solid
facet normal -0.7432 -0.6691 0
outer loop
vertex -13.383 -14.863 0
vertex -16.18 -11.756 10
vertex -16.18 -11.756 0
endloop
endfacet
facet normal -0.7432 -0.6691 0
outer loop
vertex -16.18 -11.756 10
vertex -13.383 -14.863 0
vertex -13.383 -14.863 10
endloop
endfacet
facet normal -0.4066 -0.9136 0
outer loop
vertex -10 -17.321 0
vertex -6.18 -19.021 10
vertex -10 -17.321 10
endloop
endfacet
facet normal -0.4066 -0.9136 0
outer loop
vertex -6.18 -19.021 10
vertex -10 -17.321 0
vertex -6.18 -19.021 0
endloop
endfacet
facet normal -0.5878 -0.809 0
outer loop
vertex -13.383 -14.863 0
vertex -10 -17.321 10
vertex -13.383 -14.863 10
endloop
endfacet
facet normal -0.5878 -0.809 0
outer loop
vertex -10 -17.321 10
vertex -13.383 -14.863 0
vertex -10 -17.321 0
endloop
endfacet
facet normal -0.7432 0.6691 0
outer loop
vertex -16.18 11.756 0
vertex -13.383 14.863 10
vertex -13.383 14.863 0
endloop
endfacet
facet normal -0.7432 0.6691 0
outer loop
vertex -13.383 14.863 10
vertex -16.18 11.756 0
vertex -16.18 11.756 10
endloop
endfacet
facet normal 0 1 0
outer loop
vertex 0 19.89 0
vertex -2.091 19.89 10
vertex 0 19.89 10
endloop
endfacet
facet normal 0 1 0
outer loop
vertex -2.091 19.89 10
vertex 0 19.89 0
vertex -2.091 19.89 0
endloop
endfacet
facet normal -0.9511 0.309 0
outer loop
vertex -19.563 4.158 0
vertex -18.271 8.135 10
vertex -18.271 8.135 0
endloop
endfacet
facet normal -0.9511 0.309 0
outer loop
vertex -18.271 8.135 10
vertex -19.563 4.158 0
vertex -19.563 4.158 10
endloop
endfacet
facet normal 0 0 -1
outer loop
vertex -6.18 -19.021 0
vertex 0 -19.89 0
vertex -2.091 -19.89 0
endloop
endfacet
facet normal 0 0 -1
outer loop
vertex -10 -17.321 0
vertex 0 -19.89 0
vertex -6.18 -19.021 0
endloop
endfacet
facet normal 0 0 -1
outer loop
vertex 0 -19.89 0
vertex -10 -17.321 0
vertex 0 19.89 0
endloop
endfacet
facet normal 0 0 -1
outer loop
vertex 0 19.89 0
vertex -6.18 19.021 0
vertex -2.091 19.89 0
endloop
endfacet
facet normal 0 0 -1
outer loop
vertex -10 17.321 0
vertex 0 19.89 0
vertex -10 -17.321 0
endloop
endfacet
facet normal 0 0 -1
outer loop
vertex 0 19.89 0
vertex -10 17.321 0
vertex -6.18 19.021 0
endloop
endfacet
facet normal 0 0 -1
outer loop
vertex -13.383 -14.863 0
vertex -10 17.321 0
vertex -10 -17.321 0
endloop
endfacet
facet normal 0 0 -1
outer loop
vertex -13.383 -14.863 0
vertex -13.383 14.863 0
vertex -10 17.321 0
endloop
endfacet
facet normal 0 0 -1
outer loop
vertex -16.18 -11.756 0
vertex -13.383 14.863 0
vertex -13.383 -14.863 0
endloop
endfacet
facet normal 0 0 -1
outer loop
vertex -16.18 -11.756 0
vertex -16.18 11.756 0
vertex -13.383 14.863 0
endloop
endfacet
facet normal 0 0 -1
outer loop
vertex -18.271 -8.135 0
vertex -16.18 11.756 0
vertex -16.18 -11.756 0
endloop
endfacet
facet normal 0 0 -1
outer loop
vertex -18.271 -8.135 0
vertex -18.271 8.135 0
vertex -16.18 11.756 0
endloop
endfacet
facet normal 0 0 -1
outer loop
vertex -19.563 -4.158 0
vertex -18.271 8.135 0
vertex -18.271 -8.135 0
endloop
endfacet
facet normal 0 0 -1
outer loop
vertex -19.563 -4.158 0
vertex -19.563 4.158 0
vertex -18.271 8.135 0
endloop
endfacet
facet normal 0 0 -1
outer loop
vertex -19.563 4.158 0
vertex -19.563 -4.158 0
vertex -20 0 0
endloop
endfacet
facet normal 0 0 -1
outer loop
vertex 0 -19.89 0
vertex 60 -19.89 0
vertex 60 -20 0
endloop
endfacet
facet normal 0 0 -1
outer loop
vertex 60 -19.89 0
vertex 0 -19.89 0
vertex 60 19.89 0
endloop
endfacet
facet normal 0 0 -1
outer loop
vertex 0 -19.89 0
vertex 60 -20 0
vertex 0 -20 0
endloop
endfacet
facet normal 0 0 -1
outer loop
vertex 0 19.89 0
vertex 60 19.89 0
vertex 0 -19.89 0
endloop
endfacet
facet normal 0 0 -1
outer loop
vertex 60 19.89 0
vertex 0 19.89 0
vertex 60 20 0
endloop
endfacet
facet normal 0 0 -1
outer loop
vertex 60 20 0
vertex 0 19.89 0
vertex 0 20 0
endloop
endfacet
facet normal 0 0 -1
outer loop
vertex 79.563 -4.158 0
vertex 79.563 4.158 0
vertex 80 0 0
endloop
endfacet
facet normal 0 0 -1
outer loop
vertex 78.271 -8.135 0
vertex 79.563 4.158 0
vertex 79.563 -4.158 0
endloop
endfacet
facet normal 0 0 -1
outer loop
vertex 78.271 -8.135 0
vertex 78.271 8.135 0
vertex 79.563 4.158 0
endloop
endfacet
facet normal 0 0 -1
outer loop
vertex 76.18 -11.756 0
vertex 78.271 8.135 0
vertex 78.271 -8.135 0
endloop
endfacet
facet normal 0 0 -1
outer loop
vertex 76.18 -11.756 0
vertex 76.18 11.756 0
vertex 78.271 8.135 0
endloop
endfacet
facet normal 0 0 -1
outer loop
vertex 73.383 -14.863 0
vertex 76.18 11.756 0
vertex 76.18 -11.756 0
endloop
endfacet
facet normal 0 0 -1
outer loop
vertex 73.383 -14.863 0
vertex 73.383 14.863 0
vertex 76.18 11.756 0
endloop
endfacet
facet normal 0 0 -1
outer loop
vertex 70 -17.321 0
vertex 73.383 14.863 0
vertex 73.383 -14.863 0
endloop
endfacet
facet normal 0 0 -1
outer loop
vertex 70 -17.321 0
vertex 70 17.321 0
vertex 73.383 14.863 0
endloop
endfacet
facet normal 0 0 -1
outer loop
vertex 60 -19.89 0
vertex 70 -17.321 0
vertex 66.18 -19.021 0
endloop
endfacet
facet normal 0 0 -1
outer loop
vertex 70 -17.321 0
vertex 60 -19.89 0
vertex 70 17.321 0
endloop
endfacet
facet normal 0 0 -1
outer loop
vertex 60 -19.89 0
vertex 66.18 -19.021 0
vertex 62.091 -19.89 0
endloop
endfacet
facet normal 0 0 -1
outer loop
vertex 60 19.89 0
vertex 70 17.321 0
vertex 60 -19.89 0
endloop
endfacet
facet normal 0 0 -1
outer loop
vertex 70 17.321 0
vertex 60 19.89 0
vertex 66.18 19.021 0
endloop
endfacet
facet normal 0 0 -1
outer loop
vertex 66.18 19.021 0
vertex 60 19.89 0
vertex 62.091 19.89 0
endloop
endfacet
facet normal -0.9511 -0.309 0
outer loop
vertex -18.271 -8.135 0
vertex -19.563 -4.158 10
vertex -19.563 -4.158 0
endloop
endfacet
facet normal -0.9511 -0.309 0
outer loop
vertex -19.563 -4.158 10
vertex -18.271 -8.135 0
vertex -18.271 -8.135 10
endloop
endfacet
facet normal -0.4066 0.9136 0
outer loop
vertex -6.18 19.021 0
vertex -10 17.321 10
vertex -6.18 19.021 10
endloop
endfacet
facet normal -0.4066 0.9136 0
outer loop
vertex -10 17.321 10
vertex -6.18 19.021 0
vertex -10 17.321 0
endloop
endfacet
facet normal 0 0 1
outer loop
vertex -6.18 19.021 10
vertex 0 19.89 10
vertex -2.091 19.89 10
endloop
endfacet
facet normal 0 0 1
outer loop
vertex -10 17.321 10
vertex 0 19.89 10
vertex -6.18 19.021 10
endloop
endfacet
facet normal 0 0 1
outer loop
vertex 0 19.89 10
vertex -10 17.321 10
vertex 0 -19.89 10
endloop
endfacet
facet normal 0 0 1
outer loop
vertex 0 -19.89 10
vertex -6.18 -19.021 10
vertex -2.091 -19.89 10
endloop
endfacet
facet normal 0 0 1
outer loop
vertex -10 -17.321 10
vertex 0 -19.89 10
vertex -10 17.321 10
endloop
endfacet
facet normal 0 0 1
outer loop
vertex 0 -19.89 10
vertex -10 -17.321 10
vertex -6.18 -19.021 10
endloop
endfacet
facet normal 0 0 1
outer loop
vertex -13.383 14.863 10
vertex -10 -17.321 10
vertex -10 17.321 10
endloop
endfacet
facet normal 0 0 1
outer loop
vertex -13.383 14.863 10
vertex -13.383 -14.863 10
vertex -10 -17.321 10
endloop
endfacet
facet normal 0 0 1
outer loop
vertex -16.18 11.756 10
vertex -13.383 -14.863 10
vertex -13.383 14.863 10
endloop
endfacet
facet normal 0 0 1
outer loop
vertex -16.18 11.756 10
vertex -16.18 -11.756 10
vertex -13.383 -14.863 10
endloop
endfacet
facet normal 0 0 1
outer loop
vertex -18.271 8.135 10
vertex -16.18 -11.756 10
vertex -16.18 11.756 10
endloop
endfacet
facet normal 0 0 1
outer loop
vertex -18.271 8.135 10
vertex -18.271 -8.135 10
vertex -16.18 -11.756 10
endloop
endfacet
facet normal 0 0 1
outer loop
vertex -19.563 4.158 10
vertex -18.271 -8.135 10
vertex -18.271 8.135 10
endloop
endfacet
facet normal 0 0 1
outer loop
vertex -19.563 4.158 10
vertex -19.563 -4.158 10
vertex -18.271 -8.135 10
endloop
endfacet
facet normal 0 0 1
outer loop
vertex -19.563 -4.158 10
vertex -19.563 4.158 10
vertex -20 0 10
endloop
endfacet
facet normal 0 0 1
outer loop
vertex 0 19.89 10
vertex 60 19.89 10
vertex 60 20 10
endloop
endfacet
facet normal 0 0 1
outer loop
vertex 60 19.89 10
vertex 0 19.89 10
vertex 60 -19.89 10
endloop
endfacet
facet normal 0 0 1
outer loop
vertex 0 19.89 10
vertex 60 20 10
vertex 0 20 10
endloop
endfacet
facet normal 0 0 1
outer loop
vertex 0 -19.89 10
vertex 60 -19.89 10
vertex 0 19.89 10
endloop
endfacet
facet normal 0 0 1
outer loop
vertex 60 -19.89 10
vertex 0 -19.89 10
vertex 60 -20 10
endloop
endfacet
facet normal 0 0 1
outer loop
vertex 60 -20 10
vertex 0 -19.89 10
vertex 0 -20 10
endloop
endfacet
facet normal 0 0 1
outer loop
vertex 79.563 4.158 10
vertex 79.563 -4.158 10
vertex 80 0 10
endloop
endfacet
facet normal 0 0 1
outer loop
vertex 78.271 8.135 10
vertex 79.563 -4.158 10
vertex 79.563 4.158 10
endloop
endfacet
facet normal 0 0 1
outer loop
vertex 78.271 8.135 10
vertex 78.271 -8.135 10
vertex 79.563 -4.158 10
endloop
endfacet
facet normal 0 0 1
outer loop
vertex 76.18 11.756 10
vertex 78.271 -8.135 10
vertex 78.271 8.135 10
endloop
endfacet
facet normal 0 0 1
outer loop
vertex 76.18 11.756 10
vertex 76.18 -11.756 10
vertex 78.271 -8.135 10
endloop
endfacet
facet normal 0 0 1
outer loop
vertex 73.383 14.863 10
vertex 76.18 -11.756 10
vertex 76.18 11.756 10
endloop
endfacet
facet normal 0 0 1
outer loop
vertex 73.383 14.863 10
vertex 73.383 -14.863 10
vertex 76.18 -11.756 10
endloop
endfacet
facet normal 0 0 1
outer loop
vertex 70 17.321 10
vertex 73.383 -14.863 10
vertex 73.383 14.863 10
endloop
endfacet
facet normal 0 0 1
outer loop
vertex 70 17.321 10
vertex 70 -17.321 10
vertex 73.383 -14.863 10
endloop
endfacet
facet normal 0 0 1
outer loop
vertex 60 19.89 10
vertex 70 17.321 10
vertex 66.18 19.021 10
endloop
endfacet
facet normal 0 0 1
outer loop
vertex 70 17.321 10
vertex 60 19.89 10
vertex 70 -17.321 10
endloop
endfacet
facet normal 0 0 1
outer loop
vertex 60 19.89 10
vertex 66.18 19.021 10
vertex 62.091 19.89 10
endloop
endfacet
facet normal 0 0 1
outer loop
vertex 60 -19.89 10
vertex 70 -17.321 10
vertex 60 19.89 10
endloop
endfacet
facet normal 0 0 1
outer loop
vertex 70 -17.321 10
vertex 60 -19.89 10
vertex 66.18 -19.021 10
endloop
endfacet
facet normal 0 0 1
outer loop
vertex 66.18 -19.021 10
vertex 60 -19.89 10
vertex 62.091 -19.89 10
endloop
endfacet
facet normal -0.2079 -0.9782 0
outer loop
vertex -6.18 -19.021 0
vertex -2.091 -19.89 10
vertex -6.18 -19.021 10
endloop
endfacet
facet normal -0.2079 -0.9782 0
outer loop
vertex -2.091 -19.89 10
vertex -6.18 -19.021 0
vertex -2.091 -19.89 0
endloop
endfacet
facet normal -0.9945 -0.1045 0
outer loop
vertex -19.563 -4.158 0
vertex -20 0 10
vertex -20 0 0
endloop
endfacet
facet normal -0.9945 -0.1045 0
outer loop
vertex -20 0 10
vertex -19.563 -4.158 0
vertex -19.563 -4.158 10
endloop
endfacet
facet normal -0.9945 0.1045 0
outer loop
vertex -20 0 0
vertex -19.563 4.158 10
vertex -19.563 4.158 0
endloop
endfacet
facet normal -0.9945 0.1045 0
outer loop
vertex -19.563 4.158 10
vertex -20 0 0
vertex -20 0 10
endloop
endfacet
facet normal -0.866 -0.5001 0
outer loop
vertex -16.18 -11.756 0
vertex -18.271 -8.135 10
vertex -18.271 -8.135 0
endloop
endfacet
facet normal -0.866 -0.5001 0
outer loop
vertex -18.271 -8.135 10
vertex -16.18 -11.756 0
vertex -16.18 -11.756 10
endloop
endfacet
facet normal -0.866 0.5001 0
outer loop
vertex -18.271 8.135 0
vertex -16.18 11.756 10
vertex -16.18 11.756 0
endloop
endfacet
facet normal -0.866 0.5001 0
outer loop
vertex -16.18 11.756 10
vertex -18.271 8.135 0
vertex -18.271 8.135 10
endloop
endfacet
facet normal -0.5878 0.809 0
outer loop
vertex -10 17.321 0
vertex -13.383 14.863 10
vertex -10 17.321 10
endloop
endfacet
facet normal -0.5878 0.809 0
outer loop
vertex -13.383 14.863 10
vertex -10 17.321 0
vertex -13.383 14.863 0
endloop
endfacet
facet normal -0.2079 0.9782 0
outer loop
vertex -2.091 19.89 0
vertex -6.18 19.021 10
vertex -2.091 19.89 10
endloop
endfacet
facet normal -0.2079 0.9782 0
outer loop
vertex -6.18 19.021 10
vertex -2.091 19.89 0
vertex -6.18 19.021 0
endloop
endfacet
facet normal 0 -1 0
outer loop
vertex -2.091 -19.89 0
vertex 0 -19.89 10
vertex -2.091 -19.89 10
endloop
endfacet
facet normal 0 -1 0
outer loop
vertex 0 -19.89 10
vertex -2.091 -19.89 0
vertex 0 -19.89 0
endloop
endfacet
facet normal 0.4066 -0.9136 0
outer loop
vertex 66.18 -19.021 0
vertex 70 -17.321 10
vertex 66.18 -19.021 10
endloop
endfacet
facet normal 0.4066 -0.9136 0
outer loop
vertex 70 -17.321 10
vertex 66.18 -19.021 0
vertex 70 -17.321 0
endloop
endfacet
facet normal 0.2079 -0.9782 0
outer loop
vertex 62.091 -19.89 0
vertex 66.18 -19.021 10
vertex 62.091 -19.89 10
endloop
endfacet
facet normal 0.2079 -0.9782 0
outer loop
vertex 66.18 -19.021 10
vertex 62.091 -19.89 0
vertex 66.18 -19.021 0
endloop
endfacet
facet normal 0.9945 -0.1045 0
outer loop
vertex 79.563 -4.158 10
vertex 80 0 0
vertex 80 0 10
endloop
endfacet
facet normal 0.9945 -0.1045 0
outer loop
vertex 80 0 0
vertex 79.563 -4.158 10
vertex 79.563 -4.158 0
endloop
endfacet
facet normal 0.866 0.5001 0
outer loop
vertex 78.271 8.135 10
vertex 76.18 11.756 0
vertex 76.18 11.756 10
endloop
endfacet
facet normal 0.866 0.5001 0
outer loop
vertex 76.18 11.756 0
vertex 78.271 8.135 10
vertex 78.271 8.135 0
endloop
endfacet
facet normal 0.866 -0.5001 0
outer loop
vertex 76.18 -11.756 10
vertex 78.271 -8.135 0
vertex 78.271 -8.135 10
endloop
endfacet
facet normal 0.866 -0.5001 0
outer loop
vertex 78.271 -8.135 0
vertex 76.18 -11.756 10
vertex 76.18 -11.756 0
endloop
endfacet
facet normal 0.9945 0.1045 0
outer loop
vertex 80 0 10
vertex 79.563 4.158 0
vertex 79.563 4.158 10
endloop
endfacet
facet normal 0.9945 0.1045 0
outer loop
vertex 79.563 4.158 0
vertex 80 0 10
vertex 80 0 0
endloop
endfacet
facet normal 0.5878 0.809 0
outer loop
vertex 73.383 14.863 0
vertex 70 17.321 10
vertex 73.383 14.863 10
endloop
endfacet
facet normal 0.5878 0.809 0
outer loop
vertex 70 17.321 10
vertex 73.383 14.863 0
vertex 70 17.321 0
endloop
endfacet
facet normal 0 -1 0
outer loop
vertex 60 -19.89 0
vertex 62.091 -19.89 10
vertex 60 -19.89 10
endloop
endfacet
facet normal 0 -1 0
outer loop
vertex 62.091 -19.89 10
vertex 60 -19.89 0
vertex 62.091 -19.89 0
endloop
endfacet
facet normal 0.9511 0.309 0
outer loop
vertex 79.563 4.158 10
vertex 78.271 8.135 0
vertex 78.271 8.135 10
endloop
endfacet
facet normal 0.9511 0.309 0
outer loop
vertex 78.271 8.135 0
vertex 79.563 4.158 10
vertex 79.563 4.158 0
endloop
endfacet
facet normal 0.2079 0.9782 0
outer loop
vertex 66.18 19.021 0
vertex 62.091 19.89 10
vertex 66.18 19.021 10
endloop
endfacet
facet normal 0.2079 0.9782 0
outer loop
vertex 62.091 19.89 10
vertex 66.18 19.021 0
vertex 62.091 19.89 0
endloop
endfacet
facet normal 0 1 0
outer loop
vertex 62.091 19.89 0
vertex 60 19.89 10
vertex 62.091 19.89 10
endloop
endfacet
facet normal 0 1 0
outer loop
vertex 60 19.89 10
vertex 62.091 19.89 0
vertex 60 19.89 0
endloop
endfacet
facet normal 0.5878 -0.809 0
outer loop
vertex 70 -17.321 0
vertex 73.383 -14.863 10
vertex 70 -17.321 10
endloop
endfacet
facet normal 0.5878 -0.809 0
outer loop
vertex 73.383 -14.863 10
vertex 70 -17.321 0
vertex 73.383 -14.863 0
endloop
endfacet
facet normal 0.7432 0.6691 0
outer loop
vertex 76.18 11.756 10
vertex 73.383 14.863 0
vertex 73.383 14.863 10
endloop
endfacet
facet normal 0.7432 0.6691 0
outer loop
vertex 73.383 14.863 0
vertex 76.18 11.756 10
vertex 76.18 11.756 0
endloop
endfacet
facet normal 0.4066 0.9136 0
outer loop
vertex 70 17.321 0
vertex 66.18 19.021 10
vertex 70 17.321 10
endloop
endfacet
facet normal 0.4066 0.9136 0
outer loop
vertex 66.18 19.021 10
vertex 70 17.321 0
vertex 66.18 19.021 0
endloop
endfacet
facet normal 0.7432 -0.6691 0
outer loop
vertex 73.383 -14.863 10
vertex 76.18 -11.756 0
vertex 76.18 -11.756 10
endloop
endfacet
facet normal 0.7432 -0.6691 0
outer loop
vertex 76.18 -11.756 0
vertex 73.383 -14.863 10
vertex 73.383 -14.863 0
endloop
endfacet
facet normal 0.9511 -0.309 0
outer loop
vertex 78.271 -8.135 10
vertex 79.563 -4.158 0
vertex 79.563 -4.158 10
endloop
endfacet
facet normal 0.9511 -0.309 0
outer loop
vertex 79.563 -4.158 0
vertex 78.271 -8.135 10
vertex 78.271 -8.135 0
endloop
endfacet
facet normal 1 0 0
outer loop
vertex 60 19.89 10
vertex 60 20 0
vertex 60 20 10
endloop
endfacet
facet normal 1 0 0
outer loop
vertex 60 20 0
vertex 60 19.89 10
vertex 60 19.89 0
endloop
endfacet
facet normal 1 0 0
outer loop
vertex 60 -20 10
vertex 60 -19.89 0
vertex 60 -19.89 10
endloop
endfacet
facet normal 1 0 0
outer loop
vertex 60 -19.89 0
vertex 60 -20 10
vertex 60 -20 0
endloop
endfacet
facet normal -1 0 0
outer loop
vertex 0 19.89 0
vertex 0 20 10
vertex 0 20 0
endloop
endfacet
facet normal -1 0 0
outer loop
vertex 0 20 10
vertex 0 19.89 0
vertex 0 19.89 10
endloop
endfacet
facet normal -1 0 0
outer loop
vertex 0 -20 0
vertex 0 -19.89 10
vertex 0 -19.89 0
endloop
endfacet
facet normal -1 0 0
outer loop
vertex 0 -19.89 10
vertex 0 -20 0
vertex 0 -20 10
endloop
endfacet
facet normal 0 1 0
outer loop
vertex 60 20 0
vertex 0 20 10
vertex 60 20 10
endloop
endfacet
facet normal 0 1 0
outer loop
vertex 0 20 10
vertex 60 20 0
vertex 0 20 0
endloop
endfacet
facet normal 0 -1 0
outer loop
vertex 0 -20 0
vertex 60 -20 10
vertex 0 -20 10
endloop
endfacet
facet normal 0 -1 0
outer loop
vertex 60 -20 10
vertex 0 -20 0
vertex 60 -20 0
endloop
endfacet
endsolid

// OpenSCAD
module placa_snowbord(grosime, raza, lungime)
{

cylinder(h=grosime,r=raza);

translate([lungime - 2 * raza,0,0])
cylinder(h=grosime,r=raza);
   translate([0, -raza, 0]) cube([lungime - 2 * raza, 2*raza,grosime]);
}
placa_snowbord(grosime=10, raza=20, lungime=100);
//.......
module placa_snowbord2(grosime, raza, lungime)
{
    hull(){

cylinder(h=grosime,r=raza);

translate([lungime - 2 * raza,0,0])
cylinder(h=grosime,r=raza);
   
}
}
placa_snowbord(grosime=10, raza=20, lungime=100);
